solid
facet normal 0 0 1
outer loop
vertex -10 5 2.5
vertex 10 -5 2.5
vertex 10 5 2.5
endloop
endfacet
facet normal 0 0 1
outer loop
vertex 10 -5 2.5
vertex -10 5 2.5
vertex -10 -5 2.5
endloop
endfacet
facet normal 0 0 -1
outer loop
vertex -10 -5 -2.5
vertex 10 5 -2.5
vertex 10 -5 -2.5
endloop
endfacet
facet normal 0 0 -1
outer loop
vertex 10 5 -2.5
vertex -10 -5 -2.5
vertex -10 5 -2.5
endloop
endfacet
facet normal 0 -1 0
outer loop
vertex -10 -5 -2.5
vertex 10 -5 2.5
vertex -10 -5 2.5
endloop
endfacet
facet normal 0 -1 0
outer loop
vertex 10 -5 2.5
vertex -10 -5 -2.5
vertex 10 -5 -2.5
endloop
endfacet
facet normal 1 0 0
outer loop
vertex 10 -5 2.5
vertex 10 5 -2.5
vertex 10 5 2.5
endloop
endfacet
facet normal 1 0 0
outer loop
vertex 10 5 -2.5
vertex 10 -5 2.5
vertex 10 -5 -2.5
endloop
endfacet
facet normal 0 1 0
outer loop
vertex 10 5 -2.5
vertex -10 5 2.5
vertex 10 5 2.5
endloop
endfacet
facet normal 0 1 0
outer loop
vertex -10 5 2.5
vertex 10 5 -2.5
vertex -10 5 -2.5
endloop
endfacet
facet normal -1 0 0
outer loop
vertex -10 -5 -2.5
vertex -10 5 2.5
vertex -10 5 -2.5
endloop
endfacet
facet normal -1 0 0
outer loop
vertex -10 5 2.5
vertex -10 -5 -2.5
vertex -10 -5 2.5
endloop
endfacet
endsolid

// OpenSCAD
// Simplest possible model: a centred box.
cube([20, 10, 5], center = true);
